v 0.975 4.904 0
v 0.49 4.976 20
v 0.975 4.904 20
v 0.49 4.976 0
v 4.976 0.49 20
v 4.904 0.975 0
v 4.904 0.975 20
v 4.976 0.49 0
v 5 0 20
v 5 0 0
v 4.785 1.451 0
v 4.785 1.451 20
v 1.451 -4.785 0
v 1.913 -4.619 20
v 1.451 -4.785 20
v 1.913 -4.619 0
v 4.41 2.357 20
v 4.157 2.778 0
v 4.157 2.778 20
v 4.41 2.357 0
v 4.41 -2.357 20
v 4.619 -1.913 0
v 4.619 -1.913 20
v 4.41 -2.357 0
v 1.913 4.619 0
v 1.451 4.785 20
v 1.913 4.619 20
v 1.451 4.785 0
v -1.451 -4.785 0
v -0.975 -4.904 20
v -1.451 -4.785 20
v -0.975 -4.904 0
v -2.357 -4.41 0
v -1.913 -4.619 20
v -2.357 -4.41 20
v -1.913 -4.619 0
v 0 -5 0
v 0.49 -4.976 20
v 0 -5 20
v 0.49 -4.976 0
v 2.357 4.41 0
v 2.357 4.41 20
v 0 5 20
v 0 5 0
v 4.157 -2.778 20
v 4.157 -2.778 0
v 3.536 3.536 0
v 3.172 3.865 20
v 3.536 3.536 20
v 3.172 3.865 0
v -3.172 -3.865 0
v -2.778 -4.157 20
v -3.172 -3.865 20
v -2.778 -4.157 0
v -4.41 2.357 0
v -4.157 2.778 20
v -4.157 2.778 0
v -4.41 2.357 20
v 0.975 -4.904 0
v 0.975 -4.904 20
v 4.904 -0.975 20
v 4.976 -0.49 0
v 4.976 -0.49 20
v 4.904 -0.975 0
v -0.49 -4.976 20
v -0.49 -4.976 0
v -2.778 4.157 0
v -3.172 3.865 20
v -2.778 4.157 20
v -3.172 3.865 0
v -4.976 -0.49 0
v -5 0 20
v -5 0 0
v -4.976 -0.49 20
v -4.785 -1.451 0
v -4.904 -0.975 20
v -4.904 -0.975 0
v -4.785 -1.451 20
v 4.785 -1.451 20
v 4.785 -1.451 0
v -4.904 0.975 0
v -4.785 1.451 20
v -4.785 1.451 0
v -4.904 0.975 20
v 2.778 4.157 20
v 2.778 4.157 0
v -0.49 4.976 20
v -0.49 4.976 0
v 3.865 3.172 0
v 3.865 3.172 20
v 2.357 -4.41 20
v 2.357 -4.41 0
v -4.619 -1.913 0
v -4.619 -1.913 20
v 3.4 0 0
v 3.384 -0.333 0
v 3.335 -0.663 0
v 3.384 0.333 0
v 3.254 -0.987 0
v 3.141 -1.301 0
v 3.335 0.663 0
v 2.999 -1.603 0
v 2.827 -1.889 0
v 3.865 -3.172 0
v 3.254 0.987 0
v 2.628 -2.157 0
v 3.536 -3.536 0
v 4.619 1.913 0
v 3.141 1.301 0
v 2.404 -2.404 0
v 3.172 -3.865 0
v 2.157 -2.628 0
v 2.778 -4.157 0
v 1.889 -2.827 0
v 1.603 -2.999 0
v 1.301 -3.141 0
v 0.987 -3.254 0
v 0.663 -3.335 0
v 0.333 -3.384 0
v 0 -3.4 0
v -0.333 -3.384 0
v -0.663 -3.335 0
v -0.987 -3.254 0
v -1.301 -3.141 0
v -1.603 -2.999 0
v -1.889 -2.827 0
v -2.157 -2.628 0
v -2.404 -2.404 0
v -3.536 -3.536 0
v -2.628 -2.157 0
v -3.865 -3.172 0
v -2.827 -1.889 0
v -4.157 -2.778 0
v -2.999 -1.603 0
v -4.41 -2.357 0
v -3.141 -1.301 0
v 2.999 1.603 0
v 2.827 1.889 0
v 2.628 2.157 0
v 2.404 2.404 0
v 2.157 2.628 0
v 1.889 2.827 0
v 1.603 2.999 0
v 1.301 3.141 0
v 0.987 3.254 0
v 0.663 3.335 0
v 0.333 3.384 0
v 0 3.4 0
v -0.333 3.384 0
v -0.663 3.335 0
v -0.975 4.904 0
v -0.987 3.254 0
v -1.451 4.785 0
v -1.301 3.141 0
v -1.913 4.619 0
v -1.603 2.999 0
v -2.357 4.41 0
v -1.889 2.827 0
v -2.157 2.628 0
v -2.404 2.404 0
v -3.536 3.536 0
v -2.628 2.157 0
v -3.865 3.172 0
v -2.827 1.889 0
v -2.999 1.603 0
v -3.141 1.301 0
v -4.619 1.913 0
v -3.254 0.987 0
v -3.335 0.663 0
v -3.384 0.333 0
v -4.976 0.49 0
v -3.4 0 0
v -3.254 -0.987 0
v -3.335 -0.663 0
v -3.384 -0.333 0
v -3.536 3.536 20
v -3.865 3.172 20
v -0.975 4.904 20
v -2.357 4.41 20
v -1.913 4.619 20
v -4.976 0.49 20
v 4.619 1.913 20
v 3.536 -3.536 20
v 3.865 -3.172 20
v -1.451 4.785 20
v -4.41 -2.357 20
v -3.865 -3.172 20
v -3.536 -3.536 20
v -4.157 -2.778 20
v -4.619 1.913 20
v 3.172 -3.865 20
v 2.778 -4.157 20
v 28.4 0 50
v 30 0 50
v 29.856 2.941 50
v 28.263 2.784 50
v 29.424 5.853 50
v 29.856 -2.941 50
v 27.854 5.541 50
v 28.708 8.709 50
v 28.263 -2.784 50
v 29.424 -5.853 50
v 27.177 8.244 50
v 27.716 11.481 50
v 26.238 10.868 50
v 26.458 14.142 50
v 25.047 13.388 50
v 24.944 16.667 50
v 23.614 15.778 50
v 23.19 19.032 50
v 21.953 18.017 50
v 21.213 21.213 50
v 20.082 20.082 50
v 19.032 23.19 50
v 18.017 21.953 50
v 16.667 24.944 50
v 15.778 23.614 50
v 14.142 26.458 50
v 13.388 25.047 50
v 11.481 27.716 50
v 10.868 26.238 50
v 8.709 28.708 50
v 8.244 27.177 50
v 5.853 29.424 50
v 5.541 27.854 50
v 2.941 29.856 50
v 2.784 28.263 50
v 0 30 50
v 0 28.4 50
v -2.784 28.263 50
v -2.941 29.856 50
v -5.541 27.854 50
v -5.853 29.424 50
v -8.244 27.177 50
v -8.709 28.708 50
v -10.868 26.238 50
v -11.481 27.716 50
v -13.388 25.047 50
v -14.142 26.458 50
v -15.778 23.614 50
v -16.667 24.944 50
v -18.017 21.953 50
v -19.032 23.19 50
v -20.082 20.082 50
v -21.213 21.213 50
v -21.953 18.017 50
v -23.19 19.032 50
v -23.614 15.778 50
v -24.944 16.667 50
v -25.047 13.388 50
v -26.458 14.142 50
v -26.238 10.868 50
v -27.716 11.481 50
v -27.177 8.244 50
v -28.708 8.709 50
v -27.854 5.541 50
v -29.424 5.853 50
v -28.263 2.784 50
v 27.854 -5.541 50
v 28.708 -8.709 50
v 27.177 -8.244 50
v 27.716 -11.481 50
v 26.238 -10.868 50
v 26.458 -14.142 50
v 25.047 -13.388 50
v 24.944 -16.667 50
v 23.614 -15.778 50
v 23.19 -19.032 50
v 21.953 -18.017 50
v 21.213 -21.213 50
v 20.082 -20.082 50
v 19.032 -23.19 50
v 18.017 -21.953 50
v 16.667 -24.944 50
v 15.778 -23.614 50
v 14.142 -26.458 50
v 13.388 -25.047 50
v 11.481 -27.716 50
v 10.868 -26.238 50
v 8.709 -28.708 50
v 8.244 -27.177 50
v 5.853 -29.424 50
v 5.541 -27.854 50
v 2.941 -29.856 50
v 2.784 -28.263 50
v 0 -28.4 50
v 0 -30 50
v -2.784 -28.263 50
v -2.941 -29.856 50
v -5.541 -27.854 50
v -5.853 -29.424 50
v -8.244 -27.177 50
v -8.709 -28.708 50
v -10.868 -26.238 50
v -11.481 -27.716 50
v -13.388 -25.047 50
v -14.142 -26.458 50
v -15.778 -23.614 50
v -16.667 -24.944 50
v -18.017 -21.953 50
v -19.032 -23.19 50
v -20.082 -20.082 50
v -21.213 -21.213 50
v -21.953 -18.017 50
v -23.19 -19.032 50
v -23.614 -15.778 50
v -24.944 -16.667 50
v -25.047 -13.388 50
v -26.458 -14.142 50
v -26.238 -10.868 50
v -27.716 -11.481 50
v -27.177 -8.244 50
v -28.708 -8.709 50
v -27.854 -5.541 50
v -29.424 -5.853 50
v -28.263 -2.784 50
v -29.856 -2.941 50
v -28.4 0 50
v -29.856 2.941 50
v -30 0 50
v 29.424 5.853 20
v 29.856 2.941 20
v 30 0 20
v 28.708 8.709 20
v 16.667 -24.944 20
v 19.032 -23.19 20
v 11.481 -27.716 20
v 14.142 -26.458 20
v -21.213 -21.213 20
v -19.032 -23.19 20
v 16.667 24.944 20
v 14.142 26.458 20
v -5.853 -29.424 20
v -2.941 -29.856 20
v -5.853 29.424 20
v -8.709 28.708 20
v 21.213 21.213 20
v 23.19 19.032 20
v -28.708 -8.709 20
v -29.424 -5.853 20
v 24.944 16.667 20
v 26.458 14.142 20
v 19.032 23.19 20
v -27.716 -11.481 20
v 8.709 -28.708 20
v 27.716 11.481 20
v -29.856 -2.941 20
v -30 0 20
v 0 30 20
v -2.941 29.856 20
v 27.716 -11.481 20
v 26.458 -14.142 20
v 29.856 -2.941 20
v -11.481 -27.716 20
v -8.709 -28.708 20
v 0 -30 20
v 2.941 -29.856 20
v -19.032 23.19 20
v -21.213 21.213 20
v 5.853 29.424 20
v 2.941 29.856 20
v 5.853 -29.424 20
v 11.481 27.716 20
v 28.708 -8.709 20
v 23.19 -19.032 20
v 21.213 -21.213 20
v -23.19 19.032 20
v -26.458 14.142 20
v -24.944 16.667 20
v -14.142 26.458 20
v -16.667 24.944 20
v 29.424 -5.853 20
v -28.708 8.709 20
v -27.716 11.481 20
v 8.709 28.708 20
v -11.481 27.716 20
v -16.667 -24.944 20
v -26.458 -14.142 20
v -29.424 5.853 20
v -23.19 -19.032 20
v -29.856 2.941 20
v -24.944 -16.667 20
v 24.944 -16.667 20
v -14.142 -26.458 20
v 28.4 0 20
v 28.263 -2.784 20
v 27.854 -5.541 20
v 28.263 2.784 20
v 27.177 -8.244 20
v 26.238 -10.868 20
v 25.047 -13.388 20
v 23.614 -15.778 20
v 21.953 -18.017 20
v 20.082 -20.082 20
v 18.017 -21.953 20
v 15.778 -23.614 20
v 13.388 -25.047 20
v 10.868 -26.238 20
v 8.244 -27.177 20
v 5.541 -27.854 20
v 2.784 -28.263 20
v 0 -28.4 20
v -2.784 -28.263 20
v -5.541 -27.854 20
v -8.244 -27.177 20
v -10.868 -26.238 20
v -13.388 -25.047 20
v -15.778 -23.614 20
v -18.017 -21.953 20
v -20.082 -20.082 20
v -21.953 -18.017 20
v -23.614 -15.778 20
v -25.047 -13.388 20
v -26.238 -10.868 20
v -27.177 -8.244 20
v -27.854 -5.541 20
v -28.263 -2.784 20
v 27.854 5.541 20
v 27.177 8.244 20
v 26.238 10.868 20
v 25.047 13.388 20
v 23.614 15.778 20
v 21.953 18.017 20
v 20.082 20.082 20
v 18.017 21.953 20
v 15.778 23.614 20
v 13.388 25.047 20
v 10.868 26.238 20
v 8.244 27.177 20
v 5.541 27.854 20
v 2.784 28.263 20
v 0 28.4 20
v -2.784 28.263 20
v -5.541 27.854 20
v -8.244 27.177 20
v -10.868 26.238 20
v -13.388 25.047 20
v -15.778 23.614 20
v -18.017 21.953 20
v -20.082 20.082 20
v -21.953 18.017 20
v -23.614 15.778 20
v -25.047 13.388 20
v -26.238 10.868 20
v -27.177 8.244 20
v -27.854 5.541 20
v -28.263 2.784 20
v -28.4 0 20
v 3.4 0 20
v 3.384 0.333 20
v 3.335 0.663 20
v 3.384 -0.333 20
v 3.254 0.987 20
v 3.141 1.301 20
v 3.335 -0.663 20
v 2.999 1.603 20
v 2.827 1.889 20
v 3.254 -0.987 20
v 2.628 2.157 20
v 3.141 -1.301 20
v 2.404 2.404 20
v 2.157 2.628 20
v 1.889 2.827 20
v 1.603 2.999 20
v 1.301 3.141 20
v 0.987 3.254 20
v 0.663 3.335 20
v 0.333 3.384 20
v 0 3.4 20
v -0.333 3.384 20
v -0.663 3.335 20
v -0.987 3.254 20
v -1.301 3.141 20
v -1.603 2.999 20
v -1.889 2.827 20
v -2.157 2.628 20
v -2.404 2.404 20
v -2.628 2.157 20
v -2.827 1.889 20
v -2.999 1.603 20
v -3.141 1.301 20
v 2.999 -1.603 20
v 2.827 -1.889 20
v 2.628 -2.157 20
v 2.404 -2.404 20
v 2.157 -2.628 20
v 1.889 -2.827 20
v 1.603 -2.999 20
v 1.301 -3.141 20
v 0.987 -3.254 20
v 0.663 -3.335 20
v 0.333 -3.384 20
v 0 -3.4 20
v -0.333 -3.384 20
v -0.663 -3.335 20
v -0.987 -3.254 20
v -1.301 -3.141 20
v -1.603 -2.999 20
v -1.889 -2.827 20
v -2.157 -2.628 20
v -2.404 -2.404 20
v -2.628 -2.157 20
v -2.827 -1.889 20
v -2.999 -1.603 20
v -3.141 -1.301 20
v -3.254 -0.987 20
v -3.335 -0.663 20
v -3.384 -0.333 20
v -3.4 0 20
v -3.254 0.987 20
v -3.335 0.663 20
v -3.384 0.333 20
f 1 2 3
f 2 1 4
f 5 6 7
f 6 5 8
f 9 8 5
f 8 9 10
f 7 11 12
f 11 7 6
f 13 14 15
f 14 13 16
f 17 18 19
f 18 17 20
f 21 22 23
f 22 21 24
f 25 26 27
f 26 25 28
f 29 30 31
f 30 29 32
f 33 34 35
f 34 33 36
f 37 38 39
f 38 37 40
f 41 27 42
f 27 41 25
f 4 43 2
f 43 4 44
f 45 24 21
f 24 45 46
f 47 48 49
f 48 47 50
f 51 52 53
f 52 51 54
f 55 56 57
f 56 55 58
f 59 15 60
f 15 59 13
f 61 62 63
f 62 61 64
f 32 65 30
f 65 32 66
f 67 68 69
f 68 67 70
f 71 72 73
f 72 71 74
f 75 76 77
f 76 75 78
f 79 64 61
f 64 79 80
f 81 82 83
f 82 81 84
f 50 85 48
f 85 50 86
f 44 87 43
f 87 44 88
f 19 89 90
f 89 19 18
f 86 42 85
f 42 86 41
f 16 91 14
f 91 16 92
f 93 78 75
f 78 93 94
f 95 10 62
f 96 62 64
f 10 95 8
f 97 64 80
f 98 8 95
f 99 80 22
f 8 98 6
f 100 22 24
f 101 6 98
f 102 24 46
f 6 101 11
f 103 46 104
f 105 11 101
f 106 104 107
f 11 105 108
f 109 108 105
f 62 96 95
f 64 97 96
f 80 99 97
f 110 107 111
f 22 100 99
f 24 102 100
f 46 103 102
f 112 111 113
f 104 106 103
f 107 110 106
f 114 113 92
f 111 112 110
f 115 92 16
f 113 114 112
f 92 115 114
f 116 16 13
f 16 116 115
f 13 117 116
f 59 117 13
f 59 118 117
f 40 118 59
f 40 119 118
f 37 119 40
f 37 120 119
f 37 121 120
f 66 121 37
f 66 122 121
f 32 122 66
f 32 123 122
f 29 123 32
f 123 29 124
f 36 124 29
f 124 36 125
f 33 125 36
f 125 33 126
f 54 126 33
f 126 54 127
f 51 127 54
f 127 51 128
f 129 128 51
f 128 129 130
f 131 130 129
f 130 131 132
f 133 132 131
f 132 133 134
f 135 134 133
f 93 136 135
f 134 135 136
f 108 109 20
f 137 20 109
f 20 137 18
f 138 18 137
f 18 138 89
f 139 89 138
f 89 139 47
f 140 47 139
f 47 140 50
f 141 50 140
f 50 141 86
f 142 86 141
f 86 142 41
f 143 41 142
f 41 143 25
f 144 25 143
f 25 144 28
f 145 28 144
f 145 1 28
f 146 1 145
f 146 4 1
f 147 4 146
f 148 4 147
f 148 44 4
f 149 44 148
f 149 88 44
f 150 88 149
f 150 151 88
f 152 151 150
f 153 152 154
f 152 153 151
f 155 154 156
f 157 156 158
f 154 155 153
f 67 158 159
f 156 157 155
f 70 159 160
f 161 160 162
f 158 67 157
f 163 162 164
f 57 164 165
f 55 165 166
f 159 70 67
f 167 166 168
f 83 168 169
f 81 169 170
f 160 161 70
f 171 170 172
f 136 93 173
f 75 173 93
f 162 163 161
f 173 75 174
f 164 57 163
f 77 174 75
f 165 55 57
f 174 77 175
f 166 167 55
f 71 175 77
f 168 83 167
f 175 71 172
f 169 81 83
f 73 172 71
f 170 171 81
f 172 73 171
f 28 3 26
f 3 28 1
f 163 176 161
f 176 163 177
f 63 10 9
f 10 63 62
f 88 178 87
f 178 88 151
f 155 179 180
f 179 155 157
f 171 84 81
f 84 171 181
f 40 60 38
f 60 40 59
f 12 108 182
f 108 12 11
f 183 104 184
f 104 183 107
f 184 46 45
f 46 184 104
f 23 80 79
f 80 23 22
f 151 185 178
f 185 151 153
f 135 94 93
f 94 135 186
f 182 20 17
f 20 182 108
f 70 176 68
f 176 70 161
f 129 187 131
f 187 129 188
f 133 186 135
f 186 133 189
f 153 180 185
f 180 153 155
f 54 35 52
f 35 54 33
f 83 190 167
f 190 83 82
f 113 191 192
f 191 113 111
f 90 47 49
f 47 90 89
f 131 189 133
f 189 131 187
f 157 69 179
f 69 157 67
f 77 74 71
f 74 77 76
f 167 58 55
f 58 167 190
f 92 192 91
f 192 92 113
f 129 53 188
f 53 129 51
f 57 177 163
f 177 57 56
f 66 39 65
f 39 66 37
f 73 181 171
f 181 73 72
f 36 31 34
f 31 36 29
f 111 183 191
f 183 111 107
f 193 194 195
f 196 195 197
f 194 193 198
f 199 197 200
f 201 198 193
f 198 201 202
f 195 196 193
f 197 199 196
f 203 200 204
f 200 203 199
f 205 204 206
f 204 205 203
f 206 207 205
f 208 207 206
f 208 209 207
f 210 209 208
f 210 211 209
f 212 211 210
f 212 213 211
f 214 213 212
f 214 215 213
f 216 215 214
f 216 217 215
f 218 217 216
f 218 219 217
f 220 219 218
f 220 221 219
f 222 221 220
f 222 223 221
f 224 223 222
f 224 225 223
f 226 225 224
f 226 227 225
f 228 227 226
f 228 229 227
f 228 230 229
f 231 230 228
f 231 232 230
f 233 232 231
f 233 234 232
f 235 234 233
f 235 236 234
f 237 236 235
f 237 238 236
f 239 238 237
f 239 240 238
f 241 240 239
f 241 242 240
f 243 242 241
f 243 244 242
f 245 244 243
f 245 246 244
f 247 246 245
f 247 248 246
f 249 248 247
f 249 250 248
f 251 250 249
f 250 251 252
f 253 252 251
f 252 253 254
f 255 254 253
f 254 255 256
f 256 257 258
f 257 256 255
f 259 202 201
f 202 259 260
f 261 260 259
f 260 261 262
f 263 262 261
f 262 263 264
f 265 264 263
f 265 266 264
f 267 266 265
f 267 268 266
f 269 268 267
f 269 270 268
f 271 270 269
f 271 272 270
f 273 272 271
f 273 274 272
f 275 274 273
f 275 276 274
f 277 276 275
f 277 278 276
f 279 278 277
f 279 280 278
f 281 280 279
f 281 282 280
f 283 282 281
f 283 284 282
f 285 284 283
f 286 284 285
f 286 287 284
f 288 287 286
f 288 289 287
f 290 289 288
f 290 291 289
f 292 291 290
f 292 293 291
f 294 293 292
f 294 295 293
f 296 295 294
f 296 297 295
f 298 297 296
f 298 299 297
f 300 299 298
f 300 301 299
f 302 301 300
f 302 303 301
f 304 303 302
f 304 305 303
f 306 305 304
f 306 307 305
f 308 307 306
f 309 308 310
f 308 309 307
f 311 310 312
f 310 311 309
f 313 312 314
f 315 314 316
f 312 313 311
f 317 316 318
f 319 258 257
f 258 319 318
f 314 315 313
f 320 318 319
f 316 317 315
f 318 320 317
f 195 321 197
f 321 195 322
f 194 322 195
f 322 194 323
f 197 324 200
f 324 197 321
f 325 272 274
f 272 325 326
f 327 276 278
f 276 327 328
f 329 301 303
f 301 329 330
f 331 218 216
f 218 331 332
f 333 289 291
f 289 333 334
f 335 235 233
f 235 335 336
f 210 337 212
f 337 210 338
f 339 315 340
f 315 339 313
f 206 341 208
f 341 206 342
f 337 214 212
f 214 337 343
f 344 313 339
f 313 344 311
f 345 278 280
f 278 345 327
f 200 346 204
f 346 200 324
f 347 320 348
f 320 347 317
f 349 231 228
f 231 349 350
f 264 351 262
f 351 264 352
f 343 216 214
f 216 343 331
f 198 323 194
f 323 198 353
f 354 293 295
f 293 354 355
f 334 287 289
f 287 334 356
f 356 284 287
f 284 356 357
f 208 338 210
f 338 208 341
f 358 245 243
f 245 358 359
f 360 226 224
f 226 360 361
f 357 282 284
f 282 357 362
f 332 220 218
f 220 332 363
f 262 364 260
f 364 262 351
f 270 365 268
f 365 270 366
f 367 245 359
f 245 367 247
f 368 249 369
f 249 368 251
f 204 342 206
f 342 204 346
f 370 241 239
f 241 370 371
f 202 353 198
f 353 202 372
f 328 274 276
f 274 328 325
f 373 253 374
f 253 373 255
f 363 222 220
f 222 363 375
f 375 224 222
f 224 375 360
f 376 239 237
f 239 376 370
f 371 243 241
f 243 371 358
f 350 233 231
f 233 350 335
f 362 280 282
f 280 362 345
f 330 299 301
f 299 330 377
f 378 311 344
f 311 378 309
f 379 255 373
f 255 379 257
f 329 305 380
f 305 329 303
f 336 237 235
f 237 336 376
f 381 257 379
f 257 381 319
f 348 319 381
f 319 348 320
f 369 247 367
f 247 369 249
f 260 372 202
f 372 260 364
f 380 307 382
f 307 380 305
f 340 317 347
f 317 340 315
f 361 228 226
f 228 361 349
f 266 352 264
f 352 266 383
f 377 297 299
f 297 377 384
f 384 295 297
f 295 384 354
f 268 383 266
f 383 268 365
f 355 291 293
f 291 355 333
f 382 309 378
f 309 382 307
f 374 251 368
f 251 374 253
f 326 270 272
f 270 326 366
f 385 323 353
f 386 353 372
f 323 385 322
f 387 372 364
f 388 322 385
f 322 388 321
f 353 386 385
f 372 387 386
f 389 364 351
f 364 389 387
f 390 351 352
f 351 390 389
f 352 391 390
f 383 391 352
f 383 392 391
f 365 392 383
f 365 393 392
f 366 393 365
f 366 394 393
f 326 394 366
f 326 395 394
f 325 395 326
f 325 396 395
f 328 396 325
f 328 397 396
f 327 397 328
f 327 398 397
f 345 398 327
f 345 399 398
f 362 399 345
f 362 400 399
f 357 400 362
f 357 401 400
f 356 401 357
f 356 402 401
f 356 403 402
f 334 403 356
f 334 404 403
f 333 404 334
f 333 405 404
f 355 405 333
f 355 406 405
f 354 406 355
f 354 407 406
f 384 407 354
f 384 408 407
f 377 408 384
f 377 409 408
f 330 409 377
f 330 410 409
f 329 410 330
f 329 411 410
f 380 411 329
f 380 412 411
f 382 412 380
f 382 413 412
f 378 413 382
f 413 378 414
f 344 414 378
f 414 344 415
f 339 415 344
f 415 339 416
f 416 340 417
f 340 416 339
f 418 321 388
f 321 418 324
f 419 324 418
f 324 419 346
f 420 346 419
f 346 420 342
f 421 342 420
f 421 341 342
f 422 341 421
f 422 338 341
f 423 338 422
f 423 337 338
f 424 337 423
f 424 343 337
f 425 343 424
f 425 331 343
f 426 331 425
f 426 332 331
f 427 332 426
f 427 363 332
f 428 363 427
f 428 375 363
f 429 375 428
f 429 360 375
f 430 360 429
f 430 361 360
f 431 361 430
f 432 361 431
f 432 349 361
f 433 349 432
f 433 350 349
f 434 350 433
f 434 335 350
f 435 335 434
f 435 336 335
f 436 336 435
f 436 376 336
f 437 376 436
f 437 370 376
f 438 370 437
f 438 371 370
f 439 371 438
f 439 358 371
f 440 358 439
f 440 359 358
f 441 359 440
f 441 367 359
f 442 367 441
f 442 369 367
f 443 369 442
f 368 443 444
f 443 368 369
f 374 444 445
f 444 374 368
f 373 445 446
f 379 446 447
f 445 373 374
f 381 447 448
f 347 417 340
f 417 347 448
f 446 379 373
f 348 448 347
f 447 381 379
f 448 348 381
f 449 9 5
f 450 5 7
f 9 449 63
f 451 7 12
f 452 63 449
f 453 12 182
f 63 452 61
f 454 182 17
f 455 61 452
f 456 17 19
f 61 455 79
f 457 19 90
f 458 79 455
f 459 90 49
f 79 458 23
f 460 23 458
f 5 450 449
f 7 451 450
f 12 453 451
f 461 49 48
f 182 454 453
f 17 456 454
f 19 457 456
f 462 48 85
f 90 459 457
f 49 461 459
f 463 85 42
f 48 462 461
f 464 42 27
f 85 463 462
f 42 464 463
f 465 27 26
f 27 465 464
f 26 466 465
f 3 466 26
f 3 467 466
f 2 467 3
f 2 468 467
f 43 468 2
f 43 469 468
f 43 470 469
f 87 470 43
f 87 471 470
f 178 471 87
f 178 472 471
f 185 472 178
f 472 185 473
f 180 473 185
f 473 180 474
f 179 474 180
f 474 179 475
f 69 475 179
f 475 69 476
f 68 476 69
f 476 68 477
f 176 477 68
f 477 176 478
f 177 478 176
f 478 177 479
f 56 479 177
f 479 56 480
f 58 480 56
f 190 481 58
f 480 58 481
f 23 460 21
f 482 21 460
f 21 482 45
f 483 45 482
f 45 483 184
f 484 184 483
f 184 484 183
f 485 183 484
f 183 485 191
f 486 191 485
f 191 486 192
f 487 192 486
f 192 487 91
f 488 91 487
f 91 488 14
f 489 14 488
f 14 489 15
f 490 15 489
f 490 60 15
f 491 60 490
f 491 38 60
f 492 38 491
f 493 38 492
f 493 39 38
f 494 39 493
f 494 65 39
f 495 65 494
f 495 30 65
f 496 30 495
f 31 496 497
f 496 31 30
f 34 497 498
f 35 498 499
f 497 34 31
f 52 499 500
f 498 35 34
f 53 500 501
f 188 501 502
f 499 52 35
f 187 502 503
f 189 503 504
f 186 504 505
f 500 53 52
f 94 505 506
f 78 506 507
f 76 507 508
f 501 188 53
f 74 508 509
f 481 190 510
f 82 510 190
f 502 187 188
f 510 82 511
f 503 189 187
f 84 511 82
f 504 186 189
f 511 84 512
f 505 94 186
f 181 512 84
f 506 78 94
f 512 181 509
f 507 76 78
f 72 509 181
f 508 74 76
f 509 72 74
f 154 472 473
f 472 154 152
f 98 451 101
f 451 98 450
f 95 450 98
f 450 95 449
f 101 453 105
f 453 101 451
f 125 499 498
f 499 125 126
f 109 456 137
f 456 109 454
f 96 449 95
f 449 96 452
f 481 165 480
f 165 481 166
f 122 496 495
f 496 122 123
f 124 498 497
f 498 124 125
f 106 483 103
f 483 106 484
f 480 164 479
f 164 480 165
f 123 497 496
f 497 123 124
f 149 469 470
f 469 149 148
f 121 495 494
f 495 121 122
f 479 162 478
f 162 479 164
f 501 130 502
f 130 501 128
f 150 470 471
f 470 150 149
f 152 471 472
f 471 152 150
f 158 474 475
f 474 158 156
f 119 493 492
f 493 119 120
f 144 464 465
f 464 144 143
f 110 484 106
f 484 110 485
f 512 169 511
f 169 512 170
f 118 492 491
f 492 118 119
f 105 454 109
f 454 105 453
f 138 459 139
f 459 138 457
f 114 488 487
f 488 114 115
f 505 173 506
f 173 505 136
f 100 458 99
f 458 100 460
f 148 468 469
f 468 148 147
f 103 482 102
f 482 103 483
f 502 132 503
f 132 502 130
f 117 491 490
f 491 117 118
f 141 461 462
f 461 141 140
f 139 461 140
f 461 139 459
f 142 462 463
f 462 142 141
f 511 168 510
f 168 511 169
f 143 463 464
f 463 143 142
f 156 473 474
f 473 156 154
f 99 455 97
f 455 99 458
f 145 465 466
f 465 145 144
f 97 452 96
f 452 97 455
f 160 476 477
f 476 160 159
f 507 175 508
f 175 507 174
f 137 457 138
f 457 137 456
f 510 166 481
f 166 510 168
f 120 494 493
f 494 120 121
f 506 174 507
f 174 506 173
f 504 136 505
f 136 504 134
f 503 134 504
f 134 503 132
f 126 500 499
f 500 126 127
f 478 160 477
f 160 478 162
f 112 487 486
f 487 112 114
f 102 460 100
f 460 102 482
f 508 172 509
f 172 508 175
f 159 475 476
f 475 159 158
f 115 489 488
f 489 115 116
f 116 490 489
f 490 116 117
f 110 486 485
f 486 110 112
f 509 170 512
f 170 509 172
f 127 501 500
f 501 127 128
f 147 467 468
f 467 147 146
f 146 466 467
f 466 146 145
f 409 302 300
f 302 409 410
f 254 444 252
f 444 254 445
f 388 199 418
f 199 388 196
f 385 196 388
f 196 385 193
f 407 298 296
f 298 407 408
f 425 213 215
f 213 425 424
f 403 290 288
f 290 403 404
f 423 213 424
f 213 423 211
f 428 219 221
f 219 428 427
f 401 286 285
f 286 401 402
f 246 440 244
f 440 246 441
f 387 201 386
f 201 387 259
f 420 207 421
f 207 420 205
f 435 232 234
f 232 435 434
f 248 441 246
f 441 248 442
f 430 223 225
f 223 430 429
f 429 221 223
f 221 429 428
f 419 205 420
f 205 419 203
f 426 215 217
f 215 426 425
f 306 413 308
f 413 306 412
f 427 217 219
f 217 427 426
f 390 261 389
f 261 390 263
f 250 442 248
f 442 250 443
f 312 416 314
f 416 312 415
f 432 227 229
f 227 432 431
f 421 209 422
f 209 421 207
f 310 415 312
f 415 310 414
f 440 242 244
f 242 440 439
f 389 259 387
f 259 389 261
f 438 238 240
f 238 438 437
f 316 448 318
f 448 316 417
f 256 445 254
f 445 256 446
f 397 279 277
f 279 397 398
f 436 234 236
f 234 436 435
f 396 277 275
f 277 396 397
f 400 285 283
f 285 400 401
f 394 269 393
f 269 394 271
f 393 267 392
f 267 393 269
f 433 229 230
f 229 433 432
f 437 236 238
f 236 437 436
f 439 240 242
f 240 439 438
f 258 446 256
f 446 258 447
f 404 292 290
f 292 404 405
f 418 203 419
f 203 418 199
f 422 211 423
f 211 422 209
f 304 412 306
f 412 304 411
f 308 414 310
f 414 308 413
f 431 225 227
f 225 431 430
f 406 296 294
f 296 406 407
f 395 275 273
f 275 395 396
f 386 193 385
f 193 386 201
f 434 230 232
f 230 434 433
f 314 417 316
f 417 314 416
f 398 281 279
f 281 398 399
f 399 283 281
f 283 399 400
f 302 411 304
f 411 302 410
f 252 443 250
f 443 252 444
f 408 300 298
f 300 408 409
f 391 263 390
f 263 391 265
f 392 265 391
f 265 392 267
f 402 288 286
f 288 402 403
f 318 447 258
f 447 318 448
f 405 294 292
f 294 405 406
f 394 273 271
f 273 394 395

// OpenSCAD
// Funnel - a spout (tube) sitting below a conical section, open at both ends for fluid flow.
// NOVEL general part for a lab or control application.
//

spout_d = 10;
spout_z = 20;
cone_d  = 60;
rim_z   = 50;
wall    = 1.6;

$fn = 64;

ib = spout_d - 2 * wall;   // spout bore
ic = cone_d - 2 * wall;    // cone inner diameter at the join

difference() {
    union() {
        cylinder(h = spout_z, d = spout_d);                 // spout
        translate([0, 0, spout_z]) cylinder(h = rim_z - spout_z, d = spout_d);
        translate([0, 0, spout_z]) cylinder(h = rim_z - spout_z, d = cone_d);
    }
    translate([0, 0, -1]) cylinder(h = spout_z + 2, d = ib);                     // bore through spout
    translate([0, 0, spout_z]) cylinder(h = rim_z - spout_z + 1, d = ic);       // inner cone surface
}
